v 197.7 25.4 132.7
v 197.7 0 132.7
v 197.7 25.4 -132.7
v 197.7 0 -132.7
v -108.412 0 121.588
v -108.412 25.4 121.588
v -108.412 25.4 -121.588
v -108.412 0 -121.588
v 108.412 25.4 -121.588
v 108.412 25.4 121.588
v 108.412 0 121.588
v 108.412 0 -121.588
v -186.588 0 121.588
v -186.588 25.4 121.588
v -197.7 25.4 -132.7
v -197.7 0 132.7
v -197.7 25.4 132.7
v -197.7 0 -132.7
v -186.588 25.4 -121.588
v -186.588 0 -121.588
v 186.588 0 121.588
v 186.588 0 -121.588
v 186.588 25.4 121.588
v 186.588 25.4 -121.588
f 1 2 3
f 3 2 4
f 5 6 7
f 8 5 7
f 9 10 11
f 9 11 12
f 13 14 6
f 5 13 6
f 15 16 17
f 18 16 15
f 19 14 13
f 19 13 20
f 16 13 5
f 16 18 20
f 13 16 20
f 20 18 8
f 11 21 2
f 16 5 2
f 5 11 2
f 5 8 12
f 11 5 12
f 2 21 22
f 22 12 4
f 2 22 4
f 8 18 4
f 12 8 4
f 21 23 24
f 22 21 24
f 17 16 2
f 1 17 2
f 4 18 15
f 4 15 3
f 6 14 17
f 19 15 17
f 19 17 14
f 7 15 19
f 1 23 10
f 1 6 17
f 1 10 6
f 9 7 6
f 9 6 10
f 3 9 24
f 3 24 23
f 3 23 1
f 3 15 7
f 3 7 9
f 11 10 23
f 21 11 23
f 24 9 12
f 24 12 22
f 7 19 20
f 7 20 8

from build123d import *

# Parameters (mm, degrees)
SKETCH5_W           = 395.4
SKETCH5_H           = 265.4
BOSS_EXTRUDE3_DEPTH = 25.4
SKETCH6_W           = 78.175
SKETCH6_H           = 243.175
SKETCH6_W_2         = 75
SKETCH6_H_2         = 240
CUT_EXTRUDE1_DEPTH  = 240.4571778


with BuildPart() as part:
    # Sketch5 → Boss-Extrude3 (new body)
    with BuildSketch(Plane(origin=(0, 0, 0), x_dir=(1, 0, 0), z_dir=(0, 1, 0))):
        Rectangle(SKETCH5_W, SKETCH5_H)
    extrude(amount=BOSS_EXTRUDE3_DEPTH)

    # Sketch6 → Cut-Extrude1 (cut, through all)
    # profile 1 of 4: a face of its own
    with BuildSketch(Plane(origin=(0, 25.4, 0), x_dir=(1, 0, 0), z_dir=(0, 1, 0))):
        with Locations((147.5, 0)):
            Rectangle(SKETCH6_W, SKETCH6_H)
        with Locations((147.5, 0)):
            Rectangle(SKETCH6_W_2, SKETCH6_H_2, mode=Mode.SUBTRACT)
    # profile 2 of 4: a face of its own
    with BuildSketch(Plane(origin=(0, 25.4, 0), x_dir=(1, 0, 0), z_dir=(0, 1, 0))):
        with Locations((147.5, 0)):
            Rectangle(SKETCH6_W_2, SKETCH6_H_2)
    # profile 3 of 4: a face of its own
    with BuildSketch(Plane(origin=(0, 25.4, 0), x_dir=(1, 0, 0), z_dir=(0, 1, 0))):
        with Locations((-147.5, 0)):
            Rectangle(SKETCH6_W, SKETCH6_H)
        with Locations((-147.5, 0)):
            Rectangle(SKETCH6_W_2, SKETCH6_H_2, mode=Mode.SUBTRACT)
    # profile 4 of 4: a face of its own
    with BuildSketch(Plane(origin=(0, 25.4, 0), x_dir=(1, 0, 0), z_dir=(0, 1, 0))):
        with Locations((-147.5, 0)):
            Rectangle(SKETCH6_W_2, SKETCH6_H_2)
    extrude(amount=-CUT_EXTRUDE1_DEPTH, mode=Mode.SUBTRACT)


solid = part.part
